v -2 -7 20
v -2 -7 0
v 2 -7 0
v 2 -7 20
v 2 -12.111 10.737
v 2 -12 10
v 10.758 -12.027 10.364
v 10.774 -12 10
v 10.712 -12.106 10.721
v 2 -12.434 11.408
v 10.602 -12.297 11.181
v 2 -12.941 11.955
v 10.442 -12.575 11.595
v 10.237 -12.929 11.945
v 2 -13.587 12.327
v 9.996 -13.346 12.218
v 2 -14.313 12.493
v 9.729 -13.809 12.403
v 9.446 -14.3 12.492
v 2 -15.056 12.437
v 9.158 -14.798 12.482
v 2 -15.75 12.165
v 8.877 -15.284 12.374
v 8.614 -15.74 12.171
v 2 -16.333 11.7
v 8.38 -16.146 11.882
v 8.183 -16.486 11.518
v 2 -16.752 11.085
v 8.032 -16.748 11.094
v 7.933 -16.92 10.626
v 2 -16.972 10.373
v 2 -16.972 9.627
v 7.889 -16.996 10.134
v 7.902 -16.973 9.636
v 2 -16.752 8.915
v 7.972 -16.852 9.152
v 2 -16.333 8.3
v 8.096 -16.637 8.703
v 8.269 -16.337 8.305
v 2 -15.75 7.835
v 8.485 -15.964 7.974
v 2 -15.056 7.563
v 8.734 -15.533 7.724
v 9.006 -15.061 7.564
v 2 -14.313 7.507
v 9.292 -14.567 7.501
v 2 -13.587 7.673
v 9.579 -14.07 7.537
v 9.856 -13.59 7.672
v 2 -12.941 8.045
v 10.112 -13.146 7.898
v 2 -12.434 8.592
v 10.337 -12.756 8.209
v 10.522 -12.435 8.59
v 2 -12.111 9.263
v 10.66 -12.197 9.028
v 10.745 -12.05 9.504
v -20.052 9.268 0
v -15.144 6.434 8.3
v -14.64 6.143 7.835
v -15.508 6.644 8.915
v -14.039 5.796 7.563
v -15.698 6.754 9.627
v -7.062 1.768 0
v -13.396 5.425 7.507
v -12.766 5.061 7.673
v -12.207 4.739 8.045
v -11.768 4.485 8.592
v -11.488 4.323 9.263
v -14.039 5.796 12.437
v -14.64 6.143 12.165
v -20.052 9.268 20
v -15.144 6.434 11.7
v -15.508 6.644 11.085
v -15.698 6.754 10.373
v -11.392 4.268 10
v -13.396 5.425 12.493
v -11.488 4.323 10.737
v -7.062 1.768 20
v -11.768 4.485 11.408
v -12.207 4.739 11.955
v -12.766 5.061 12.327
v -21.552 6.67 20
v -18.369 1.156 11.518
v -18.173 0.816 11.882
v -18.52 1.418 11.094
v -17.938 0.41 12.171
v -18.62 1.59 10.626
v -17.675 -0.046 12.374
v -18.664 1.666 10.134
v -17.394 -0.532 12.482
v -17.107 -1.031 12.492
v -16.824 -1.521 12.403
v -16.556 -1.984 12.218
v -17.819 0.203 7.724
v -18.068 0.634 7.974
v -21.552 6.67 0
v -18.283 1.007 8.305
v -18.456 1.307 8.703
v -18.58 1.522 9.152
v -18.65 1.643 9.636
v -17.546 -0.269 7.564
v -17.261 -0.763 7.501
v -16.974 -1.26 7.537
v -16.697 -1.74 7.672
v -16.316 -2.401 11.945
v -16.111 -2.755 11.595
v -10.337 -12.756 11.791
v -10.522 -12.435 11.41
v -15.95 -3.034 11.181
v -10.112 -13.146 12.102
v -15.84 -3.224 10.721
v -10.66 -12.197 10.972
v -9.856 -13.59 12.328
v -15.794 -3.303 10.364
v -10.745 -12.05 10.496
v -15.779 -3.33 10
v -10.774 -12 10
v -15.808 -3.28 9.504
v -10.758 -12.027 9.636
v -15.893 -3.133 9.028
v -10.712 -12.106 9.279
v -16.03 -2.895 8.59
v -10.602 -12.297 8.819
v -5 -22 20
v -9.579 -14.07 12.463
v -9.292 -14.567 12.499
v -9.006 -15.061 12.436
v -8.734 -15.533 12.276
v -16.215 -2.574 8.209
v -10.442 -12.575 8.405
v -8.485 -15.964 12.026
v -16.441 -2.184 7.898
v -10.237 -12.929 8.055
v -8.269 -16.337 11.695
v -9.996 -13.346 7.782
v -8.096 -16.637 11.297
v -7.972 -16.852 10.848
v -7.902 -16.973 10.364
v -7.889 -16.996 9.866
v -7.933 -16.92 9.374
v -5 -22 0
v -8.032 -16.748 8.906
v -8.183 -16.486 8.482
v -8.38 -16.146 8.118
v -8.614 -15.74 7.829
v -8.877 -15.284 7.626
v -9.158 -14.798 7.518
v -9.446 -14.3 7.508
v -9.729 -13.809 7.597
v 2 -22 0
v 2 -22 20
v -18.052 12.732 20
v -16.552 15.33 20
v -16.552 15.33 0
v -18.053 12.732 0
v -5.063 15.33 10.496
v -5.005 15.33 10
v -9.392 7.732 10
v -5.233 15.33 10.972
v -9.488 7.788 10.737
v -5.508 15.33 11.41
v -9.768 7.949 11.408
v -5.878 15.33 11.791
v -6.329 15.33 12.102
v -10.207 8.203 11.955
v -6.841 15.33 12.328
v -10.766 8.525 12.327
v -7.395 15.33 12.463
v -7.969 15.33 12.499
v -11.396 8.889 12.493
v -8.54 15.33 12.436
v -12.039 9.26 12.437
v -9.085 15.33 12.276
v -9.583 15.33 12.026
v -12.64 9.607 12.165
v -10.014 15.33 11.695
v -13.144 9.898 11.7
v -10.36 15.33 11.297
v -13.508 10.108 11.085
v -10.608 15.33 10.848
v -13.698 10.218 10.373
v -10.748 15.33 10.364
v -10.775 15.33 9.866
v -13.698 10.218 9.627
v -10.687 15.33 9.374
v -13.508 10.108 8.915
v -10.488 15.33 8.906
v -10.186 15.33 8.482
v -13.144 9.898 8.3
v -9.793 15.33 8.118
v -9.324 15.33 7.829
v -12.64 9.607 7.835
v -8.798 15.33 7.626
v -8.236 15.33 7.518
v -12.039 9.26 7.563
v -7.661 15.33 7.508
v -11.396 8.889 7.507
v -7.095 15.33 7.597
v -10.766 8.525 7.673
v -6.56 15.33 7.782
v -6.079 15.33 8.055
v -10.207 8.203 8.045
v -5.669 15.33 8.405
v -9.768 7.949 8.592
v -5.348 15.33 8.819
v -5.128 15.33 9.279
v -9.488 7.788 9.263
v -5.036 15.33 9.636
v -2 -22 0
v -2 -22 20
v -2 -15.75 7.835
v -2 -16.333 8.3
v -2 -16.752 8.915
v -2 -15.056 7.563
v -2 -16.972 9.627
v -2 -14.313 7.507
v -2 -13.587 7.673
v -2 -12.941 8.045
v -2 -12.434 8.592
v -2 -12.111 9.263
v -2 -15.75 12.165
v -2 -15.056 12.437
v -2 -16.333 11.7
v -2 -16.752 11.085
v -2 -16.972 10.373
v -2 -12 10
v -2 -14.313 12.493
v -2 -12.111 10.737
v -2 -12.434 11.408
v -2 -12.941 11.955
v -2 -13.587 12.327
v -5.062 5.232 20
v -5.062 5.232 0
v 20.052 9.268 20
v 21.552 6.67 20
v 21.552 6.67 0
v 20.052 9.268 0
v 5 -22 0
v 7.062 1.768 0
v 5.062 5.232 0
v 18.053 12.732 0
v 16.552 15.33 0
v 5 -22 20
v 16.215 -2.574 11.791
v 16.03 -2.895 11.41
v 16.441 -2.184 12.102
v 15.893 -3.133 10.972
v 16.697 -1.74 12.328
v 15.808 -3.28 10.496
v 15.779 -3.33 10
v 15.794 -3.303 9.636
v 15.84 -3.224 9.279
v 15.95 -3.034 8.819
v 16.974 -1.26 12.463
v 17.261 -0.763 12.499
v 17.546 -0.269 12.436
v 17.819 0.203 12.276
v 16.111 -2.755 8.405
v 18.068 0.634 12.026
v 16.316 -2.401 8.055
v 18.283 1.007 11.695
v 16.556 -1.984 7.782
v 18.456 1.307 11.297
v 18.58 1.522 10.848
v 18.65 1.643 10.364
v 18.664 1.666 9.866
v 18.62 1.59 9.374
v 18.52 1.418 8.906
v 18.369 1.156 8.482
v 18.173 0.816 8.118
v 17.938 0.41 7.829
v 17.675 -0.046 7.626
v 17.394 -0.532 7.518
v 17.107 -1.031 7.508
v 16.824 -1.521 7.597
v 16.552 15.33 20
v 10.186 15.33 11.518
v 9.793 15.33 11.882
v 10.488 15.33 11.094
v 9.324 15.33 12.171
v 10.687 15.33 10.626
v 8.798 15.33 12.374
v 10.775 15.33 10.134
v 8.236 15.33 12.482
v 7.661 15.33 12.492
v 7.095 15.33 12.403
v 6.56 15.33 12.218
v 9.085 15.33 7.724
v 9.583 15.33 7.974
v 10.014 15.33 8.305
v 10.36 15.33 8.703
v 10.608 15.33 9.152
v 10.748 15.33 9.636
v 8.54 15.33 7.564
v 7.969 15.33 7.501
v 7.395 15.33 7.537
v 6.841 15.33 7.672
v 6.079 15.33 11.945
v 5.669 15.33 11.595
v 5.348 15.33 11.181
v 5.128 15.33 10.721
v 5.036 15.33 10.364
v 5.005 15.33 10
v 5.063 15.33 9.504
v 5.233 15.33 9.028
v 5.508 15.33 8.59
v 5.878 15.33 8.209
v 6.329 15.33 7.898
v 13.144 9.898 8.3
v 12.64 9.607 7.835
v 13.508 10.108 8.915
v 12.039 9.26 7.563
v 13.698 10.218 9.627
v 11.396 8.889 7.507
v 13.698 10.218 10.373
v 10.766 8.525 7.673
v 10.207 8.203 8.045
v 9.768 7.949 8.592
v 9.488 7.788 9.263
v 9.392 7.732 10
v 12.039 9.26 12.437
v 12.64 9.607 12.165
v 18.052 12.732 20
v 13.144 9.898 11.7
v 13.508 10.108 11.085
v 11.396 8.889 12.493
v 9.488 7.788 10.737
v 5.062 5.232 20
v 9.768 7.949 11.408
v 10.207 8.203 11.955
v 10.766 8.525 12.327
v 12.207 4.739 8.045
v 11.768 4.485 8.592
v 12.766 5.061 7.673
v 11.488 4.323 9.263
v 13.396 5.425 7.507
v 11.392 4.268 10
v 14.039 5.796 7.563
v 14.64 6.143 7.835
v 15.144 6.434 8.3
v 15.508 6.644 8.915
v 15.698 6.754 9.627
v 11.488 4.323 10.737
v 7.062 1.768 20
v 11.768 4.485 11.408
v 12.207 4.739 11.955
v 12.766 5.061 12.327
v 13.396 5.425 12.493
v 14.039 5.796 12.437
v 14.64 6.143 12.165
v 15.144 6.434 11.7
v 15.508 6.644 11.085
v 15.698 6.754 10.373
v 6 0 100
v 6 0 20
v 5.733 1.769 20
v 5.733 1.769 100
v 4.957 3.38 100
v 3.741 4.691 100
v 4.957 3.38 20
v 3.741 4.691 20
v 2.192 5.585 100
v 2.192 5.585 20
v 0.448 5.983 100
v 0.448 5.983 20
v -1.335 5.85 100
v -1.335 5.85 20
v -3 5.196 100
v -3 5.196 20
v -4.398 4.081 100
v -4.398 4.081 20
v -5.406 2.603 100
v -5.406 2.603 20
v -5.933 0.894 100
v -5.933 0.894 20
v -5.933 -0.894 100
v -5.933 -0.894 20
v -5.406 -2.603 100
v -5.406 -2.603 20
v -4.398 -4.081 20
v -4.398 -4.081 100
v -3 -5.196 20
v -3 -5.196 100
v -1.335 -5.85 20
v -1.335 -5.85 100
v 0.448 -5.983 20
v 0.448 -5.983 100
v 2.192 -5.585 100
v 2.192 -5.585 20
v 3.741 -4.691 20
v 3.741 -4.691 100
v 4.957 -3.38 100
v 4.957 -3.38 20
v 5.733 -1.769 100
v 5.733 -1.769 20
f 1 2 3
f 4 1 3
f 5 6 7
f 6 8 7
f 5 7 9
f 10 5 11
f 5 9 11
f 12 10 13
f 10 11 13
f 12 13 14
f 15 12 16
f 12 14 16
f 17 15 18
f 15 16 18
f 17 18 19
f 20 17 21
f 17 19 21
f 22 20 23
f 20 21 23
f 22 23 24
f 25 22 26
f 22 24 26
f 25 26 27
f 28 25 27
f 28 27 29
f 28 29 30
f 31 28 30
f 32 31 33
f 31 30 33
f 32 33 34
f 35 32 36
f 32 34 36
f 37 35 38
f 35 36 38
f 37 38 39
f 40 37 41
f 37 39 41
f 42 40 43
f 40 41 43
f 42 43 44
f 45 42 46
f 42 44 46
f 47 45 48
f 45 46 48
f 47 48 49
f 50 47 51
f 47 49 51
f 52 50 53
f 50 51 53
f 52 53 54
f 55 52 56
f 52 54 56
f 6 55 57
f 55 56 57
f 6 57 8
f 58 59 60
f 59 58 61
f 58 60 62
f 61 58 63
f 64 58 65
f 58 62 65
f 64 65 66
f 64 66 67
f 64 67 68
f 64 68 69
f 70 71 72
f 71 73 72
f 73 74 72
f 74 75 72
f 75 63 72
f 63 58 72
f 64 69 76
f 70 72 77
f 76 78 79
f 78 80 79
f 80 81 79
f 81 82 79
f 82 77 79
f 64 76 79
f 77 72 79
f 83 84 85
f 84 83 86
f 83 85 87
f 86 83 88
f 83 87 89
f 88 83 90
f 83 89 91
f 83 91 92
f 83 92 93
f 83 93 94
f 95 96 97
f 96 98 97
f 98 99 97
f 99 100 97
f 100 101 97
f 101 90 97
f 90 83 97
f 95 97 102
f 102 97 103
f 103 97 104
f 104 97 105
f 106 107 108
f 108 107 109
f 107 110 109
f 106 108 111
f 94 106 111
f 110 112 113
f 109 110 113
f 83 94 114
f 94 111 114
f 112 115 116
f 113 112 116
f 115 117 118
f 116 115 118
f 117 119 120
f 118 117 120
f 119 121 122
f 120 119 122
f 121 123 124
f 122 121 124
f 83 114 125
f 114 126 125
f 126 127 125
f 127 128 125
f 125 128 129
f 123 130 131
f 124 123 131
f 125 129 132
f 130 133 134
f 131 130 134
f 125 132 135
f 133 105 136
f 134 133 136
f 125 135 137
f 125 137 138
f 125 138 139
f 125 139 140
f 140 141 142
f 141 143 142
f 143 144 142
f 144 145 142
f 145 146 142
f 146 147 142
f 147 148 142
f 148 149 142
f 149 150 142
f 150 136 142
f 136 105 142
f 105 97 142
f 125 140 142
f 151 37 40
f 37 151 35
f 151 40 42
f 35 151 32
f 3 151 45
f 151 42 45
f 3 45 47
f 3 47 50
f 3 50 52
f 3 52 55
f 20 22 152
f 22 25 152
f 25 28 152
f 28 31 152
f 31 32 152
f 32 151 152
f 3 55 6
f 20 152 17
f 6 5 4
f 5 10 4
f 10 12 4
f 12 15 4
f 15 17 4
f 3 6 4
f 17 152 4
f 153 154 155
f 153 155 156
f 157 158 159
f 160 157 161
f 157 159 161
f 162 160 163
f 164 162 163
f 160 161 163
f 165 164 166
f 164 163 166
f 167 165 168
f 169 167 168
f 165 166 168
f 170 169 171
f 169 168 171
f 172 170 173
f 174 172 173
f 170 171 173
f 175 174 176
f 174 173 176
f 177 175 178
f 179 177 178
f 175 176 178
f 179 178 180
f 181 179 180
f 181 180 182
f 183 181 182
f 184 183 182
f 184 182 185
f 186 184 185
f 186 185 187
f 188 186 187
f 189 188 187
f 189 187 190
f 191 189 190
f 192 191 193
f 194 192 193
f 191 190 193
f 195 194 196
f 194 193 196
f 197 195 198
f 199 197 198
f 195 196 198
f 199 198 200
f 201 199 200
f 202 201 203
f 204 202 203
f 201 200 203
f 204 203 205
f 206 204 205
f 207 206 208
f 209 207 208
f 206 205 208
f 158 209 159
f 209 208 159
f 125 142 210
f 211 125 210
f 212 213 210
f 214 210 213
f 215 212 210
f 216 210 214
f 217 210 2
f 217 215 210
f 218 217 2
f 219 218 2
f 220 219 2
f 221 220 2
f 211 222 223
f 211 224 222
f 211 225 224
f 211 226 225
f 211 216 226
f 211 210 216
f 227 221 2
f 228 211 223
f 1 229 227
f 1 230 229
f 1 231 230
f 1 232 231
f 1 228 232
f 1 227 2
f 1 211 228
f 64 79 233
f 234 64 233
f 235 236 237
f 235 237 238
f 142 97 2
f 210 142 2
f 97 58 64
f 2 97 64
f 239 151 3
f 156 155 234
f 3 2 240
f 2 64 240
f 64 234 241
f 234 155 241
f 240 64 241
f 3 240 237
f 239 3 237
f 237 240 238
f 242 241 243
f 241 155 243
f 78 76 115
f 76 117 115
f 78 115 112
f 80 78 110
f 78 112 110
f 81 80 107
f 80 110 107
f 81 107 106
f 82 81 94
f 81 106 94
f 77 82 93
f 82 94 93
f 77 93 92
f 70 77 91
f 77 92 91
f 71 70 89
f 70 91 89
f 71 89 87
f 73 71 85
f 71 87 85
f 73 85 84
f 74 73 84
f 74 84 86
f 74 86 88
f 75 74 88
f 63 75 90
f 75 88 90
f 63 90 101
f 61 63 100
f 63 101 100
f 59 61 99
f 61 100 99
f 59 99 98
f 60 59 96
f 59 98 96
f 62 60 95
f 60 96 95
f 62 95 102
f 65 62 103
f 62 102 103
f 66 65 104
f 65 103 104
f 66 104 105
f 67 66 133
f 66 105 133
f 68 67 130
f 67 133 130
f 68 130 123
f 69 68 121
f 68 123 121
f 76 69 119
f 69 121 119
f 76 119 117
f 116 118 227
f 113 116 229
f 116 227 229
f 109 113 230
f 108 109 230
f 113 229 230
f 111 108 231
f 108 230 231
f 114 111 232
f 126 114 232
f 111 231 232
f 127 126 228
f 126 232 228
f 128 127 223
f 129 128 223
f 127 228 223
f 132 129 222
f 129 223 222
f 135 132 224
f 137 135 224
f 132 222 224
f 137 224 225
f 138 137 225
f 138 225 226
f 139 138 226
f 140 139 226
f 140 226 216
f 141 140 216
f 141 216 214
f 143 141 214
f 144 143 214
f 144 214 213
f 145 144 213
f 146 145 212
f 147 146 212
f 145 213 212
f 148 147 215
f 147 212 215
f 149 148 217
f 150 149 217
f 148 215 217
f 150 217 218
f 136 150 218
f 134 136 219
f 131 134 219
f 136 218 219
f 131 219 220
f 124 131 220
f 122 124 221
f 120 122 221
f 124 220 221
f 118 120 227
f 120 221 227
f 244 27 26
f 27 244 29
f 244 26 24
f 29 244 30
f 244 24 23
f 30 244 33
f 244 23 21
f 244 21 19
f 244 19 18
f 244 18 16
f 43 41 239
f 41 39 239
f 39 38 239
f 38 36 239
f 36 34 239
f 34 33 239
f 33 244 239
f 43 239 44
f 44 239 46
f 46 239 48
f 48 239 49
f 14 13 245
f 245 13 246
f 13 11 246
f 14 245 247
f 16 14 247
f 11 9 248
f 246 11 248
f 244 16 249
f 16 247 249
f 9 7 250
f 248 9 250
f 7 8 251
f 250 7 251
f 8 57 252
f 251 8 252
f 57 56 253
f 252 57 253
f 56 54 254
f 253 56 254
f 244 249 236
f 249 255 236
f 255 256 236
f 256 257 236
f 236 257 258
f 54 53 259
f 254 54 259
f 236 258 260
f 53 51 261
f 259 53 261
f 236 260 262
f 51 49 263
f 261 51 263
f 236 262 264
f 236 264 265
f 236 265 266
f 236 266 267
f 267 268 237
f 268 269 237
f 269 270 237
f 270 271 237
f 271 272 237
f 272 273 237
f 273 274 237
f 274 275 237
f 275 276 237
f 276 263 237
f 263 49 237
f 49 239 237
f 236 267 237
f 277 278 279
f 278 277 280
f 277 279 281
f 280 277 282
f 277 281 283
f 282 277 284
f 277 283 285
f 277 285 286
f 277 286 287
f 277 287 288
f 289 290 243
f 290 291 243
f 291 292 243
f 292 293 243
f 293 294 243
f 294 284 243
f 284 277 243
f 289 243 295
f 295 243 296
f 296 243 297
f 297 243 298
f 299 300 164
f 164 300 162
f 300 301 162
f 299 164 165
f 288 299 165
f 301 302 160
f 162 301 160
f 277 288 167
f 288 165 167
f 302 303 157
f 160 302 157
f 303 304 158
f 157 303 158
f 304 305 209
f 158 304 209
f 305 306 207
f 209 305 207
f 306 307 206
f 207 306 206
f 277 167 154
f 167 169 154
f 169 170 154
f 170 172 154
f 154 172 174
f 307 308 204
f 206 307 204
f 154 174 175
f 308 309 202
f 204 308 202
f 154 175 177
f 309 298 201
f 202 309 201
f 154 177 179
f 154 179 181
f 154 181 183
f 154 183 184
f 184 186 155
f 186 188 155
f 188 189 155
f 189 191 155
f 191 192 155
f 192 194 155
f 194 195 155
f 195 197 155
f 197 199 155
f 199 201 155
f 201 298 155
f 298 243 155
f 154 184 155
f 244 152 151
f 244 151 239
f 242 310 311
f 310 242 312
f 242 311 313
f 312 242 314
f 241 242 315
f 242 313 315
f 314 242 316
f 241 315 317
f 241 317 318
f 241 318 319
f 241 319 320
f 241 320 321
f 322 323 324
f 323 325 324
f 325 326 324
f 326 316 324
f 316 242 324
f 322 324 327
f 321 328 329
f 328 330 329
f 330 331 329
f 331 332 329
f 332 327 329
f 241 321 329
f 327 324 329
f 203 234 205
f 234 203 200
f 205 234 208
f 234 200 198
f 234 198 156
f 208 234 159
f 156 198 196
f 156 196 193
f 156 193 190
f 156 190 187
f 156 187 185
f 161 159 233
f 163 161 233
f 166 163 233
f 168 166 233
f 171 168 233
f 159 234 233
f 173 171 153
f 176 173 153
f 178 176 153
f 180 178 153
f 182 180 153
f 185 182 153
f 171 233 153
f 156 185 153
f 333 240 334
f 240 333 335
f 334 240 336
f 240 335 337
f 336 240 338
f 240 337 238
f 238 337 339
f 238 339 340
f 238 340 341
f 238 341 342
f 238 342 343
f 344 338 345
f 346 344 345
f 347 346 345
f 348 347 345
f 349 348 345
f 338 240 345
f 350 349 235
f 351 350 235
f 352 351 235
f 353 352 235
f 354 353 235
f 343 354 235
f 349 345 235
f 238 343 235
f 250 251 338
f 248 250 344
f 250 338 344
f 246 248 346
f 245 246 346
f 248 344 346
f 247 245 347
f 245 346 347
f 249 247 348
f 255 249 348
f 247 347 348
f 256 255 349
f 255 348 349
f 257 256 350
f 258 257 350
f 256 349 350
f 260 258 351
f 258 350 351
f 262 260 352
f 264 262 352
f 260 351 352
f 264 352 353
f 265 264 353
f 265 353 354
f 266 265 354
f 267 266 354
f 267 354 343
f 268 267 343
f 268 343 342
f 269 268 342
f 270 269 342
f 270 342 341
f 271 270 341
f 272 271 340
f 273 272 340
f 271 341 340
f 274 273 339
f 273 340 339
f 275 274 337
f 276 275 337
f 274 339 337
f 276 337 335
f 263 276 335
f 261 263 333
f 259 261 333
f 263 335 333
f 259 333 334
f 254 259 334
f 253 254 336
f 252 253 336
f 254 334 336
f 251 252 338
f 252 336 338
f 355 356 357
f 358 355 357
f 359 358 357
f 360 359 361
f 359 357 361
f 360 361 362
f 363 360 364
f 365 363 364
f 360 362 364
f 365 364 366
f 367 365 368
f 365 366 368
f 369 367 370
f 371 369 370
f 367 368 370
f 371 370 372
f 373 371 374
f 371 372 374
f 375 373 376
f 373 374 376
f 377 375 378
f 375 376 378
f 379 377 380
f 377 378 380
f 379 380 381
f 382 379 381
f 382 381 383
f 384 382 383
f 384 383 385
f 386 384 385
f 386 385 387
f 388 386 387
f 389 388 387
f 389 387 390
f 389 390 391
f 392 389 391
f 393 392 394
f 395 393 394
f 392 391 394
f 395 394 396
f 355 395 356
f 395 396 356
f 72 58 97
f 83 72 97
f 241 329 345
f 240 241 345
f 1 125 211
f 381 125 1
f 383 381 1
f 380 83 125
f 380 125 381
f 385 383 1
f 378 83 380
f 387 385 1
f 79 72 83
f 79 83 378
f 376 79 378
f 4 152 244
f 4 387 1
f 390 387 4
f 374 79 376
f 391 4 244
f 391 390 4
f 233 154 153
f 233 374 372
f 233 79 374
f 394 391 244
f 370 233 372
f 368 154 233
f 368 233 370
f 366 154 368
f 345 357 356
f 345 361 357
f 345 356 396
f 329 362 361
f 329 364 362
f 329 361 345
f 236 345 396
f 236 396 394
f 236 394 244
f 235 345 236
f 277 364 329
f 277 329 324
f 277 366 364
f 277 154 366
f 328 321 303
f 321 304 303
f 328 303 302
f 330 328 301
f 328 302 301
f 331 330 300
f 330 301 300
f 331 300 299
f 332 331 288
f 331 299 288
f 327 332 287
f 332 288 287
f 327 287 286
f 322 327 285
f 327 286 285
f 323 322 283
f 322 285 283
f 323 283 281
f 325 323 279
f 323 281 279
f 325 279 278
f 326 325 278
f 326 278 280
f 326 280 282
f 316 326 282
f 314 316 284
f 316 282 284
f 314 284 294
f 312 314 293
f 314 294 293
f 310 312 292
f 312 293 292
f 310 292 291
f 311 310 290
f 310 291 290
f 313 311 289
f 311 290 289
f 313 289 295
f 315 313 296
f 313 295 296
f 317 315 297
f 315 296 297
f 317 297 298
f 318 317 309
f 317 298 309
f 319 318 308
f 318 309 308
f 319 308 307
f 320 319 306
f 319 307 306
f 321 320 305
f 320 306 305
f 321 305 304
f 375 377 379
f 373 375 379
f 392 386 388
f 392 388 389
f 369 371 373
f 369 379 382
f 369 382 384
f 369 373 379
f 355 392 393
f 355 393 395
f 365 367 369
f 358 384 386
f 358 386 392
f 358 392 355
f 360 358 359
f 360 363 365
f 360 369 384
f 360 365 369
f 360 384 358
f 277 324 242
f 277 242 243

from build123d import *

# Parameters (mm, degrees)
F1_DEPTH  = 20
F2_W      = 4
F2_H      = 15
F3_DEPTH  = 25
F4_R      = 6
F5_DEPTH  = 80
F6_R      = 2.5
F7_DEPTH  = 12.5
F8_R      = 2.5
F9_DEPTH  = 15
F10_R     = 2.5
F11_DEPTH = 15


with BuildPart() as f1:
    # F0 (on Top) → F1 (new body)
    with BuildSketch(Plane.XY):
        Polygon((16.5525, 15.3300930227), (-16.5525, 15.3300930227), (-21.5525, 6.6698389848), (-5, -21.9999320075), (5, -21.9999320075), (21.5525, 6.6698389848), align=None)
    extrude(amount=F1_DEPTH)

    # F2 (on face) → F3 (cut)
    with BuildSketch(Plane.XY.offset(20)):
        with Locations((0, -14.4999320075)):
            Rectangle(F2_W, F2_H)
        Polygon((20.0525, 9.2679151962), (18.0525, 12.7320168113), (5.0621189432, 5.2320168113), (7.0621189432, 1.7679151962), align=None)
        Polygon((-5.0621189432, 5.2320168113), (-18.0525, 12.7320168113), (-20.0525, 9.2679151962), (-7.0621189432, 1.7679151962), align=None)
    extrude(amount=-F3_DEPTH, mode=Mode.SUBTRACT)

    # F4 (on face) → F5 (join)
    with BuildSketch(Plane.XY.offset(20)):
        Circle(F4_R)
    extrude(amount=F5_DEPTH)

    # F6 (on Right) → F7 (cut, symmetric)
    with BuildSketch(Plane.YZ):
        with Locations((-14.4999320075, 10)):
            Circle(F6_R)
    extrude(amount=F7_DEPTH, both=True, mode=Mode.SUBTRACT)

    # F8 (on face) → F9 (cut, symmetric)
    with BuildSketch(Plane(origin=(1, 1.7320508076, 0), x_dir=(0.8660254038, -0.5, 0), z_dir=(-0.5, -0.8660254038, 0))):
        with Locations((-14.4999320075, 10)):
            Circle(F8_R)
    extrude(amount=F9_DEPTH, both=True, mode=Mode.SUBTRACT)

    # F10 (on face) → F11 (cut, symmetric)
    with BuildSketch(Plane(origin=(1, -1.7320508076, 0), x_dir=(-0.8660254038, -0.5, 0), z_dir=(-0.5, 0.8660254038, 0))):
        with Locations((-14.4999320075, 10)):
            Circle(F10_R)
    extrude(amount=F11_DEPTH, both=True, mode=Mode.SUBTRACT)


solid = f1.part
